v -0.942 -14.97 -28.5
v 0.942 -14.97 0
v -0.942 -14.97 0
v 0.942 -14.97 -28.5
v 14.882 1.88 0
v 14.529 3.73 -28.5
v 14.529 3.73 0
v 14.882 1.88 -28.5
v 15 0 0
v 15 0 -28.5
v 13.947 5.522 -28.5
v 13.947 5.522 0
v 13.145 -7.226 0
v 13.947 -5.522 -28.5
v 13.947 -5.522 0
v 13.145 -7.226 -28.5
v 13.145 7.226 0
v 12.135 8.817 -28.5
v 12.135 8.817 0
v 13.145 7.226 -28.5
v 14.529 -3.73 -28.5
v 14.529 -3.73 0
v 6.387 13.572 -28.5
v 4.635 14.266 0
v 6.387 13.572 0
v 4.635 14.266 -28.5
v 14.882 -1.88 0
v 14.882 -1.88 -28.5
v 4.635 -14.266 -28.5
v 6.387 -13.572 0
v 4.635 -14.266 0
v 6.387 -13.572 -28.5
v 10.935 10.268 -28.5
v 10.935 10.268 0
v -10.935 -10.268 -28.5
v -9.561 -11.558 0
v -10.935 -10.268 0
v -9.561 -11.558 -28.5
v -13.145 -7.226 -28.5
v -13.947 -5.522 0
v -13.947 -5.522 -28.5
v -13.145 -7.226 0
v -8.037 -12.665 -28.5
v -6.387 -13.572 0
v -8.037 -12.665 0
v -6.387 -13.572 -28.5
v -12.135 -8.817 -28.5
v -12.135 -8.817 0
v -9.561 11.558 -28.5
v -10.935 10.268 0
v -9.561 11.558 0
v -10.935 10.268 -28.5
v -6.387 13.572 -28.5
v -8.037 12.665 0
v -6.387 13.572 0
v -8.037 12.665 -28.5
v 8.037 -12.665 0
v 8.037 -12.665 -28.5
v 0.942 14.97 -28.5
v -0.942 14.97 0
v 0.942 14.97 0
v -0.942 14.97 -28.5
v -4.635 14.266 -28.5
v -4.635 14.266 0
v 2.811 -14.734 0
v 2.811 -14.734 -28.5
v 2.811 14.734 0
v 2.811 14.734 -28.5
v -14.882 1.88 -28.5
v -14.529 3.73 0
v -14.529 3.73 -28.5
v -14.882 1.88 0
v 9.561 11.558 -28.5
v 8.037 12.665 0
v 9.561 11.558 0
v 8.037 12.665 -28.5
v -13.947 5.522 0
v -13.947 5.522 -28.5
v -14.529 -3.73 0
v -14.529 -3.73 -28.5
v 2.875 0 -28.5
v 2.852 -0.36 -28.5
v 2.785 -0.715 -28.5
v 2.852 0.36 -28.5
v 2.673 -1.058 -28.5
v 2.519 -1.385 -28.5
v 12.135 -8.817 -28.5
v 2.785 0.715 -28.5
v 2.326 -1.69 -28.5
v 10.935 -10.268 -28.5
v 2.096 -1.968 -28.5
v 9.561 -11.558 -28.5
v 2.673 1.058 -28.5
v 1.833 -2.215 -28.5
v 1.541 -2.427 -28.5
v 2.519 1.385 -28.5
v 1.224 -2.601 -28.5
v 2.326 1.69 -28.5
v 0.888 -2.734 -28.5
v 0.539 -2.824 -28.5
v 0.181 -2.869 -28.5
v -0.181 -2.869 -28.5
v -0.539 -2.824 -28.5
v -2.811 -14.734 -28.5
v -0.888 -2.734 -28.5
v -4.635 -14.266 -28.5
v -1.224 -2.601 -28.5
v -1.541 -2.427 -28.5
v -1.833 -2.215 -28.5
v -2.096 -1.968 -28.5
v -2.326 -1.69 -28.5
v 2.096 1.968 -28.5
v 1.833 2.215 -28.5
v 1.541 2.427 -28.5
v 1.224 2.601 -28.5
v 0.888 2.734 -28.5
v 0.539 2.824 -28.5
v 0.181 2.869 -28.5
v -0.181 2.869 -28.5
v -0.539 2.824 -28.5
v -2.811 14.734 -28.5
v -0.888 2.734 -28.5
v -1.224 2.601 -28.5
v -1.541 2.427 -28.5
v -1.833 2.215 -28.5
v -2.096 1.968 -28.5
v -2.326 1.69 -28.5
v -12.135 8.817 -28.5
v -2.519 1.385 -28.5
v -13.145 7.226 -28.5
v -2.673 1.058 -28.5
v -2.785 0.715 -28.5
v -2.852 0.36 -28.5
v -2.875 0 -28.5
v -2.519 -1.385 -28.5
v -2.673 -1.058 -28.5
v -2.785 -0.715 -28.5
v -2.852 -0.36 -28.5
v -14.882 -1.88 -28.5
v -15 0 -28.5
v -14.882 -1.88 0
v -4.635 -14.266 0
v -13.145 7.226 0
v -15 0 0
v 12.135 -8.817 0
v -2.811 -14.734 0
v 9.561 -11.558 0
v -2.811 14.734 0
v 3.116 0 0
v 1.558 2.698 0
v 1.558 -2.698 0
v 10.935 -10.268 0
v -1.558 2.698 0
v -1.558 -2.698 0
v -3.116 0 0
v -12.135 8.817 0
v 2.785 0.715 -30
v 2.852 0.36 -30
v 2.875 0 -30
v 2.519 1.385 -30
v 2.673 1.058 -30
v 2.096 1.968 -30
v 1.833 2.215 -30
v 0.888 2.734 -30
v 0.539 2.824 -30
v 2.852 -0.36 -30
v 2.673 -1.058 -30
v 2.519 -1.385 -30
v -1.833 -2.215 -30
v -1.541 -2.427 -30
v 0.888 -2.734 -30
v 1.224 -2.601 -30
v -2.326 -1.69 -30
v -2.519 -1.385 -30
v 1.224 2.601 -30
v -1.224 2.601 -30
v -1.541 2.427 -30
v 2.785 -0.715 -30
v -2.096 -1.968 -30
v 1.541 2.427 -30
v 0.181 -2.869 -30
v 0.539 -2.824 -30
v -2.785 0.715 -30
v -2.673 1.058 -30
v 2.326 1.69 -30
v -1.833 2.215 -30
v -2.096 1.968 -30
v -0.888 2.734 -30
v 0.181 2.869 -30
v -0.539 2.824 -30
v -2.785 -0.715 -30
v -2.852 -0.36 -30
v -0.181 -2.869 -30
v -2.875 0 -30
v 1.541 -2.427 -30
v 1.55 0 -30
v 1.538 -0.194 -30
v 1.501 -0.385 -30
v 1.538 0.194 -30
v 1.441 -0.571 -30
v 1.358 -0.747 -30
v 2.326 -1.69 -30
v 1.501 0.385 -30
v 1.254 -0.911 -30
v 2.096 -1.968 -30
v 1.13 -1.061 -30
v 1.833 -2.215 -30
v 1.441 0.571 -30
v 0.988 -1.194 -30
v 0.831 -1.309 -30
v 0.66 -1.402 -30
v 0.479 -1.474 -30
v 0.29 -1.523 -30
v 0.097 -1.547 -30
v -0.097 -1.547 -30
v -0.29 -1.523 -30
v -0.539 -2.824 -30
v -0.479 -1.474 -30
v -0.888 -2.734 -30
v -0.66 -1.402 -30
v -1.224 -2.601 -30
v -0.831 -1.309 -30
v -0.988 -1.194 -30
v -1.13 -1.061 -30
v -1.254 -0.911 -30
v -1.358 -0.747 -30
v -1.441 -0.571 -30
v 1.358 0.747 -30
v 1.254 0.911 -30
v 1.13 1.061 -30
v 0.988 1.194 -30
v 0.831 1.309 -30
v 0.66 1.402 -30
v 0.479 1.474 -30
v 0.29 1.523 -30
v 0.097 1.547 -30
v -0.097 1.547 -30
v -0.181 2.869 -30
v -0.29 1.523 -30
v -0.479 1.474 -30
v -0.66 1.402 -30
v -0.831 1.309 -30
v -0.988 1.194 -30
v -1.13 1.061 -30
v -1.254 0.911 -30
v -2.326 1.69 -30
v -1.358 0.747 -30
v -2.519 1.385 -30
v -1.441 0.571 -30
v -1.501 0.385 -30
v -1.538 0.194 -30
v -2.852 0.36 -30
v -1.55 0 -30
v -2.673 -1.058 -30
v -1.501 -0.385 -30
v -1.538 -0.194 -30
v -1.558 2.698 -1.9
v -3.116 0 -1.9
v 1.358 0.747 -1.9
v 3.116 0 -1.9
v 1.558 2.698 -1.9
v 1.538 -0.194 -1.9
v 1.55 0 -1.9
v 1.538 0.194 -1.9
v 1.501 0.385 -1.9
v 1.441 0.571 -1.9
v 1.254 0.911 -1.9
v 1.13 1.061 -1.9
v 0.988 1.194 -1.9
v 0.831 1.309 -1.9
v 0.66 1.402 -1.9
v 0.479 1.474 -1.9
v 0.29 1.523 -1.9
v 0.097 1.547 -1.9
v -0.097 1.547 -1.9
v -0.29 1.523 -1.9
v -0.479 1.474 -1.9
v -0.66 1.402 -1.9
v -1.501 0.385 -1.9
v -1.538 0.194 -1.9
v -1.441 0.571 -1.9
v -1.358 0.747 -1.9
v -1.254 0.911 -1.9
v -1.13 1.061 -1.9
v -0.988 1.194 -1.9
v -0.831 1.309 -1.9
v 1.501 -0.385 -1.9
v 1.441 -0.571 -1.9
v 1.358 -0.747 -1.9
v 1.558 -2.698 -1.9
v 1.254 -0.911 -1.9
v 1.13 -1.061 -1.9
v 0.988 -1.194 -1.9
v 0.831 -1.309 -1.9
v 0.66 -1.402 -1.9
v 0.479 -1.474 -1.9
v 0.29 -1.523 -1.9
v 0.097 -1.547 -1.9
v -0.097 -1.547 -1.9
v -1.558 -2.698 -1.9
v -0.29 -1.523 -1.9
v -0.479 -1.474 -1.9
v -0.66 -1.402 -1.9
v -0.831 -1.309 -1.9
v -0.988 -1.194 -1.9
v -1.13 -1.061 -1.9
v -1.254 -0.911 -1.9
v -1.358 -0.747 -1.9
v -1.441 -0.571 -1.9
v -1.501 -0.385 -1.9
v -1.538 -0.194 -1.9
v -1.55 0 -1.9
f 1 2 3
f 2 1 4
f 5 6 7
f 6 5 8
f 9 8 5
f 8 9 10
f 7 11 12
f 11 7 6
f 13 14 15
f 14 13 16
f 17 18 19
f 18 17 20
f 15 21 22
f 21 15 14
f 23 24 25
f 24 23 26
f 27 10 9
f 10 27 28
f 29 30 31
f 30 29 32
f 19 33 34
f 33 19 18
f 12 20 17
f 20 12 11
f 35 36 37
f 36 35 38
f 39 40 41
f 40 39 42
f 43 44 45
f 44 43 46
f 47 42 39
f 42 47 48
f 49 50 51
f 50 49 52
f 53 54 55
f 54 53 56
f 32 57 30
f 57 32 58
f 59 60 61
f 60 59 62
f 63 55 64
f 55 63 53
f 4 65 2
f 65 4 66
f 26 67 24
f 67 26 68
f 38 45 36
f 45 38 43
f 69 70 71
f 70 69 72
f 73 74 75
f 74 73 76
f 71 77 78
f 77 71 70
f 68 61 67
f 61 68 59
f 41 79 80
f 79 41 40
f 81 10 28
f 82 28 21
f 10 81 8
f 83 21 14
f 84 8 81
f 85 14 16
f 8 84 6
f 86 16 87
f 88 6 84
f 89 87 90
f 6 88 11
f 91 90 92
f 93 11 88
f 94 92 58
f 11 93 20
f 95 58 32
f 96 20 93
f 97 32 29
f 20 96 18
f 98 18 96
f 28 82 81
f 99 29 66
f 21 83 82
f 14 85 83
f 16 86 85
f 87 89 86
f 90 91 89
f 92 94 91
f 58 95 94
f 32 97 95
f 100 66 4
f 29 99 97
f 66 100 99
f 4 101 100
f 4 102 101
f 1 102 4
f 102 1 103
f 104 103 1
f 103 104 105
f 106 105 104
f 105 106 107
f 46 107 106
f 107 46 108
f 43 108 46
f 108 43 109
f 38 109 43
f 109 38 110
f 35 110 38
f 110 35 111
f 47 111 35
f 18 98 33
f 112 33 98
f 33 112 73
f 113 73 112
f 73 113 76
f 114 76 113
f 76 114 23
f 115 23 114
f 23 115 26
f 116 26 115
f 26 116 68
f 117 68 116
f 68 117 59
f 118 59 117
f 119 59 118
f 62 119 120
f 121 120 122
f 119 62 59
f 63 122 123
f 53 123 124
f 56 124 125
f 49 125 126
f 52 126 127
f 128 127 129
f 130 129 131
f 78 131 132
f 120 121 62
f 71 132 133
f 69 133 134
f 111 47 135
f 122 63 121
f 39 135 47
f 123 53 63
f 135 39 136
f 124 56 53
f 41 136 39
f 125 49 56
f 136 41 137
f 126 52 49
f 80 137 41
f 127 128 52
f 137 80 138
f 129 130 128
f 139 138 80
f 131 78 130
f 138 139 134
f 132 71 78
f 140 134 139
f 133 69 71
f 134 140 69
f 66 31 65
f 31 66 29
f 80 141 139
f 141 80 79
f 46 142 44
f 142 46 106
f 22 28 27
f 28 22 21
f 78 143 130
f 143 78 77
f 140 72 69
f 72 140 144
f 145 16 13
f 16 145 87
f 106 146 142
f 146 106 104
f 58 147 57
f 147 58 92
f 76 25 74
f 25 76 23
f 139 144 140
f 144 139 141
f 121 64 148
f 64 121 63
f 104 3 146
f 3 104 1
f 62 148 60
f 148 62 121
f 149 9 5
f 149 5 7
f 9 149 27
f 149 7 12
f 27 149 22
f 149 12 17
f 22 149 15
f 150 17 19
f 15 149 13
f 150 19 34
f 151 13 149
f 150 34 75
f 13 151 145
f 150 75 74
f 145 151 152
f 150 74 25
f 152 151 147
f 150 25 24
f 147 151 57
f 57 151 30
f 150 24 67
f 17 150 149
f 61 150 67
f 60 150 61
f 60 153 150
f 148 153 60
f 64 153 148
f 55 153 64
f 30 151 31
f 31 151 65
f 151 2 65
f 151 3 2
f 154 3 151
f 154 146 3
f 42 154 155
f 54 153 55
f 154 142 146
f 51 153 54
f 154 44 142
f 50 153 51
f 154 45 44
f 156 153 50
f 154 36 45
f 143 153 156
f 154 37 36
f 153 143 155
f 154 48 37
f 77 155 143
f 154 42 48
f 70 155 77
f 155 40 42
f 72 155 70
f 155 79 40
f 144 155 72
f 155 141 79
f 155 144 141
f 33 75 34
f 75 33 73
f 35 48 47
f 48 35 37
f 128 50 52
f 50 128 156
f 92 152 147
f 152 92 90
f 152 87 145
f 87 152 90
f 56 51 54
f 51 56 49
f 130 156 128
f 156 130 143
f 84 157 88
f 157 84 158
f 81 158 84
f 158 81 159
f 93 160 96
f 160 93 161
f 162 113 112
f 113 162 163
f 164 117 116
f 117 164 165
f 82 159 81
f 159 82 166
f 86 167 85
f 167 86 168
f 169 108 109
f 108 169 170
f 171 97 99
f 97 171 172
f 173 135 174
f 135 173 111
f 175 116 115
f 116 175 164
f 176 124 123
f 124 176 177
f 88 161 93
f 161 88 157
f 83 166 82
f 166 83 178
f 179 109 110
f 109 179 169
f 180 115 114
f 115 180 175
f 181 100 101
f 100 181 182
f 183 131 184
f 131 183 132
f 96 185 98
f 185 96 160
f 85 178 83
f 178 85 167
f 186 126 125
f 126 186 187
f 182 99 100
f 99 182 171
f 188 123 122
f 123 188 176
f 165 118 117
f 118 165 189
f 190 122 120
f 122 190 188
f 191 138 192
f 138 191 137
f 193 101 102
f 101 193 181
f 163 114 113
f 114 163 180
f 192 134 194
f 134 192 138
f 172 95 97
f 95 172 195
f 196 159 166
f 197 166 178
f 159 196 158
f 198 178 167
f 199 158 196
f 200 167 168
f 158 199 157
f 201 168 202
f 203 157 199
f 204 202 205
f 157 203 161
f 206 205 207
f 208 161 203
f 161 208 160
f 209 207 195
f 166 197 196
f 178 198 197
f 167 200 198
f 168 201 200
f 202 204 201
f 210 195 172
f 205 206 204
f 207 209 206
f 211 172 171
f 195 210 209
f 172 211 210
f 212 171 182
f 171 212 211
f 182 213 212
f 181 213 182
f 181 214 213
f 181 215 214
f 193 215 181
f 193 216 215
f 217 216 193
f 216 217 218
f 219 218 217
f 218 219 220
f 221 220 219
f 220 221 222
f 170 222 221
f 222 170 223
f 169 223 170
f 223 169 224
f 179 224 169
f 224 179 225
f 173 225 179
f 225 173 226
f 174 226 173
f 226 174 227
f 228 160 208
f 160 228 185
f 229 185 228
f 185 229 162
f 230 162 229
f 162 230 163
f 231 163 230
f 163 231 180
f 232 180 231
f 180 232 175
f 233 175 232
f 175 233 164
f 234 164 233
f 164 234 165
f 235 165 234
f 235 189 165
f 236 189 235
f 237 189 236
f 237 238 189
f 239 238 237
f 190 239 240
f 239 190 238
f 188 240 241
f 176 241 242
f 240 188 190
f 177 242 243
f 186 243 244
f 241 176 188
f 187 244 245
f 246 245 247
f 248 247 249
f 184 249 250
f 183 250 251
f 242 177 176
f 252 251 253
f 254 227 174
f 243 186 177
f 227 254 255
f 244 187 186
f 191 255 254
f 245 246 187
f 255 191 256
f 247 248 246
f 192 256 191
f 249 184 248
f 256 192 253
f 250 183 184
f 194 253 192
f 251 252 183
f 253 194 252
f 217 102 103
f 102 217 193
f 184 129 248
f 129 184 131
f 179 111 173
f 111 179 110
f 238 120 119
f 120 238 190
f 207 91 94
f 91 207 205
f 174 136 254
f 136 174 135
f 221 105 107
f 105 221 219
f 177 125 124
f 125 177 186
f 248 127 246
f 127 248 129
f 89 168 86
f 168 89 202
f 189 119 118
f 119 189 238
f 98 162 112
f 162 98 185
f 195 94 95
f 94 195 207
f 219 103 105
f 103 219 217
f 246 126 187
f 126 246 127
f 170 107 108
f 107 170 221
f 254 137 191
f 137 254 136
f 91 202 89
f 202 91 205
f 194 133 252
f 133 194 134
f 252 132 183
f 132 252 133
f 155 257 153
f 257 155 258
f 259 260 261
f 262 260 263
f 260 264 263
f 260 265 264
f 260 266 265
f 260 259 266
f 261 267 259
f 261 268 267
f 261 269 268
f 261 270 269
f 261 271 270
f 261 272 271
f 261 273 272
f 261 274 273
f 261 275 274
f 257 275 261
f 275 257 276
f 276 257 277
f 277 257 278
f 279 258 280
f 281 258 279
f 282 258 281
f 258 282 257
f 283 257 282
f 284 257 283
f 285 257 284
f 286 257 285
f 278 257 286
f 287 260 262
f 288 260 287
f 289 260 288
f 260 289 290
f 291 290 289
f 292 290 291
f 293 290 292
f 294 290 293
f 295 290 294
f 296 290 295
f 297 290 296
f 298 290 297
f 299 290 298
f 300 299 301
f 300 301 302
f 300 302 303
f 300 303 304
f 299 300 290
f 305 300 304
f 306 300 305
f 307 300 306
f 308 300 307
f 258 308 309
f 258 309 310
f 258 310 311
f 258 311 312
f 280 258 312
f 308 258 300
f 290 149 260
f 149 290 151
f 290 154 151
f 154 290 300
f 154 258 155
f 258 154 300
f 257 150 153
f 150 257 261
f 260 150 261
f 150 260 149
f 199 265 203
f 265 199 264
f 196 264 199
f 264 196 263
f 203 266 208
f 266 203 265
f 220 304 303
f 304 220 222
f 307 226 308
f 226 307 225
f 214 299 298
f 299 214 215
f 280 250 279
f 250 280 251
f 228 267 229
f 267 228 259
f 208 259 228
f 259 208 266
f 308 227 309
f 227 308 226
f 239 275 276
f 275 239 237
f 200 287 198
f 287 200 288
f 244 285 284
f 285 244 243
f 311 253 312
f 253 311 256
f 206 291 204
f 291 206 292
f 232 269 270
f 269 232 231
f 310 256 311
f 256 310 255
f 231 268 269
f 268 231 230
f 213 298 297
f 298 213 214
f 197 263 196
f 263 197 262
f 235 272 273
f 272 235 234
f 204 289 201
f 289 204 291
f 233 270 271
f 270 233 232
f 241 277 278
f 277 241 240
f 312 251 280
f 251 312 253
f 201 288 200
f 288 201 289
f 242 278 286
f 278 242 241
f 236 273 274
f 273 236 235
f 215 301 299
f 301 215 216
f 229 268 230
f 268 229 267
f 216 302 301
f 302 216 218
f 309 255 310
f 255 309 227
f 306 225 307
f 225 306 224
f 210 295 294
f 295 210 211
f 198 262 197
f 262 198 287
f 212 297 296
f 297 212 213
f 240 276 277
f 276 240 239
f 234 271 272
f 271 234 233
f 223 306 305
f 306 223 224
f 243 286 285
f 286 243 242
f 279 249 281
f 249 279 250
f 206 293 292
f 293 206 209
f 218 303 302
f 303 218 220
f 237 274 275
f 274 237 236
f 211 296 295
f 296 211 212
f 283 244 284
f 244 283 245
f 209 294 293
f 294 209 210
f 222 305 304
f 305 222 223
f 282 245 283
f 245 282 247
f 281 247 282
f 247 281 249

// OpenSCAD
$fn = 50;


difference() {
	union() {
		translate(v = [0, 0, -28.5000000000]) {
			cylinder(h = 28.5000000000, r = 15.0000000000);
		}
		#translate(v = [0, 0, -30.0000000000]) {
			cylinder(h = 30, r = 2.8750000000);
		}
	}
	union() {
		translate(v = [0, 0, 0]) {
			rotate(a = [0, 0, 0]) {
				difference() {
					union() {
						translate(v = [0, 0, -1.9000000000]) {
							linear_extrude(height = 1.9000000000) {
								polygon(points = [[3.1158000000, 0.0000000000], [1.5579000000, 2.6983619531], [-1.5579000000, 2.6983619531], [-3.1158000000, 0.0000000000], [-1.5579000000, -2.6983619531], [1.5579000000, -2.6983619531]]);
							}
						}
					}
					union();
				}
			}
		}
		#translate(v = [0, 0, -100.0000000000]) {
			cylinder(h = 200, r = 1.5500000000);
		}
	}
}
